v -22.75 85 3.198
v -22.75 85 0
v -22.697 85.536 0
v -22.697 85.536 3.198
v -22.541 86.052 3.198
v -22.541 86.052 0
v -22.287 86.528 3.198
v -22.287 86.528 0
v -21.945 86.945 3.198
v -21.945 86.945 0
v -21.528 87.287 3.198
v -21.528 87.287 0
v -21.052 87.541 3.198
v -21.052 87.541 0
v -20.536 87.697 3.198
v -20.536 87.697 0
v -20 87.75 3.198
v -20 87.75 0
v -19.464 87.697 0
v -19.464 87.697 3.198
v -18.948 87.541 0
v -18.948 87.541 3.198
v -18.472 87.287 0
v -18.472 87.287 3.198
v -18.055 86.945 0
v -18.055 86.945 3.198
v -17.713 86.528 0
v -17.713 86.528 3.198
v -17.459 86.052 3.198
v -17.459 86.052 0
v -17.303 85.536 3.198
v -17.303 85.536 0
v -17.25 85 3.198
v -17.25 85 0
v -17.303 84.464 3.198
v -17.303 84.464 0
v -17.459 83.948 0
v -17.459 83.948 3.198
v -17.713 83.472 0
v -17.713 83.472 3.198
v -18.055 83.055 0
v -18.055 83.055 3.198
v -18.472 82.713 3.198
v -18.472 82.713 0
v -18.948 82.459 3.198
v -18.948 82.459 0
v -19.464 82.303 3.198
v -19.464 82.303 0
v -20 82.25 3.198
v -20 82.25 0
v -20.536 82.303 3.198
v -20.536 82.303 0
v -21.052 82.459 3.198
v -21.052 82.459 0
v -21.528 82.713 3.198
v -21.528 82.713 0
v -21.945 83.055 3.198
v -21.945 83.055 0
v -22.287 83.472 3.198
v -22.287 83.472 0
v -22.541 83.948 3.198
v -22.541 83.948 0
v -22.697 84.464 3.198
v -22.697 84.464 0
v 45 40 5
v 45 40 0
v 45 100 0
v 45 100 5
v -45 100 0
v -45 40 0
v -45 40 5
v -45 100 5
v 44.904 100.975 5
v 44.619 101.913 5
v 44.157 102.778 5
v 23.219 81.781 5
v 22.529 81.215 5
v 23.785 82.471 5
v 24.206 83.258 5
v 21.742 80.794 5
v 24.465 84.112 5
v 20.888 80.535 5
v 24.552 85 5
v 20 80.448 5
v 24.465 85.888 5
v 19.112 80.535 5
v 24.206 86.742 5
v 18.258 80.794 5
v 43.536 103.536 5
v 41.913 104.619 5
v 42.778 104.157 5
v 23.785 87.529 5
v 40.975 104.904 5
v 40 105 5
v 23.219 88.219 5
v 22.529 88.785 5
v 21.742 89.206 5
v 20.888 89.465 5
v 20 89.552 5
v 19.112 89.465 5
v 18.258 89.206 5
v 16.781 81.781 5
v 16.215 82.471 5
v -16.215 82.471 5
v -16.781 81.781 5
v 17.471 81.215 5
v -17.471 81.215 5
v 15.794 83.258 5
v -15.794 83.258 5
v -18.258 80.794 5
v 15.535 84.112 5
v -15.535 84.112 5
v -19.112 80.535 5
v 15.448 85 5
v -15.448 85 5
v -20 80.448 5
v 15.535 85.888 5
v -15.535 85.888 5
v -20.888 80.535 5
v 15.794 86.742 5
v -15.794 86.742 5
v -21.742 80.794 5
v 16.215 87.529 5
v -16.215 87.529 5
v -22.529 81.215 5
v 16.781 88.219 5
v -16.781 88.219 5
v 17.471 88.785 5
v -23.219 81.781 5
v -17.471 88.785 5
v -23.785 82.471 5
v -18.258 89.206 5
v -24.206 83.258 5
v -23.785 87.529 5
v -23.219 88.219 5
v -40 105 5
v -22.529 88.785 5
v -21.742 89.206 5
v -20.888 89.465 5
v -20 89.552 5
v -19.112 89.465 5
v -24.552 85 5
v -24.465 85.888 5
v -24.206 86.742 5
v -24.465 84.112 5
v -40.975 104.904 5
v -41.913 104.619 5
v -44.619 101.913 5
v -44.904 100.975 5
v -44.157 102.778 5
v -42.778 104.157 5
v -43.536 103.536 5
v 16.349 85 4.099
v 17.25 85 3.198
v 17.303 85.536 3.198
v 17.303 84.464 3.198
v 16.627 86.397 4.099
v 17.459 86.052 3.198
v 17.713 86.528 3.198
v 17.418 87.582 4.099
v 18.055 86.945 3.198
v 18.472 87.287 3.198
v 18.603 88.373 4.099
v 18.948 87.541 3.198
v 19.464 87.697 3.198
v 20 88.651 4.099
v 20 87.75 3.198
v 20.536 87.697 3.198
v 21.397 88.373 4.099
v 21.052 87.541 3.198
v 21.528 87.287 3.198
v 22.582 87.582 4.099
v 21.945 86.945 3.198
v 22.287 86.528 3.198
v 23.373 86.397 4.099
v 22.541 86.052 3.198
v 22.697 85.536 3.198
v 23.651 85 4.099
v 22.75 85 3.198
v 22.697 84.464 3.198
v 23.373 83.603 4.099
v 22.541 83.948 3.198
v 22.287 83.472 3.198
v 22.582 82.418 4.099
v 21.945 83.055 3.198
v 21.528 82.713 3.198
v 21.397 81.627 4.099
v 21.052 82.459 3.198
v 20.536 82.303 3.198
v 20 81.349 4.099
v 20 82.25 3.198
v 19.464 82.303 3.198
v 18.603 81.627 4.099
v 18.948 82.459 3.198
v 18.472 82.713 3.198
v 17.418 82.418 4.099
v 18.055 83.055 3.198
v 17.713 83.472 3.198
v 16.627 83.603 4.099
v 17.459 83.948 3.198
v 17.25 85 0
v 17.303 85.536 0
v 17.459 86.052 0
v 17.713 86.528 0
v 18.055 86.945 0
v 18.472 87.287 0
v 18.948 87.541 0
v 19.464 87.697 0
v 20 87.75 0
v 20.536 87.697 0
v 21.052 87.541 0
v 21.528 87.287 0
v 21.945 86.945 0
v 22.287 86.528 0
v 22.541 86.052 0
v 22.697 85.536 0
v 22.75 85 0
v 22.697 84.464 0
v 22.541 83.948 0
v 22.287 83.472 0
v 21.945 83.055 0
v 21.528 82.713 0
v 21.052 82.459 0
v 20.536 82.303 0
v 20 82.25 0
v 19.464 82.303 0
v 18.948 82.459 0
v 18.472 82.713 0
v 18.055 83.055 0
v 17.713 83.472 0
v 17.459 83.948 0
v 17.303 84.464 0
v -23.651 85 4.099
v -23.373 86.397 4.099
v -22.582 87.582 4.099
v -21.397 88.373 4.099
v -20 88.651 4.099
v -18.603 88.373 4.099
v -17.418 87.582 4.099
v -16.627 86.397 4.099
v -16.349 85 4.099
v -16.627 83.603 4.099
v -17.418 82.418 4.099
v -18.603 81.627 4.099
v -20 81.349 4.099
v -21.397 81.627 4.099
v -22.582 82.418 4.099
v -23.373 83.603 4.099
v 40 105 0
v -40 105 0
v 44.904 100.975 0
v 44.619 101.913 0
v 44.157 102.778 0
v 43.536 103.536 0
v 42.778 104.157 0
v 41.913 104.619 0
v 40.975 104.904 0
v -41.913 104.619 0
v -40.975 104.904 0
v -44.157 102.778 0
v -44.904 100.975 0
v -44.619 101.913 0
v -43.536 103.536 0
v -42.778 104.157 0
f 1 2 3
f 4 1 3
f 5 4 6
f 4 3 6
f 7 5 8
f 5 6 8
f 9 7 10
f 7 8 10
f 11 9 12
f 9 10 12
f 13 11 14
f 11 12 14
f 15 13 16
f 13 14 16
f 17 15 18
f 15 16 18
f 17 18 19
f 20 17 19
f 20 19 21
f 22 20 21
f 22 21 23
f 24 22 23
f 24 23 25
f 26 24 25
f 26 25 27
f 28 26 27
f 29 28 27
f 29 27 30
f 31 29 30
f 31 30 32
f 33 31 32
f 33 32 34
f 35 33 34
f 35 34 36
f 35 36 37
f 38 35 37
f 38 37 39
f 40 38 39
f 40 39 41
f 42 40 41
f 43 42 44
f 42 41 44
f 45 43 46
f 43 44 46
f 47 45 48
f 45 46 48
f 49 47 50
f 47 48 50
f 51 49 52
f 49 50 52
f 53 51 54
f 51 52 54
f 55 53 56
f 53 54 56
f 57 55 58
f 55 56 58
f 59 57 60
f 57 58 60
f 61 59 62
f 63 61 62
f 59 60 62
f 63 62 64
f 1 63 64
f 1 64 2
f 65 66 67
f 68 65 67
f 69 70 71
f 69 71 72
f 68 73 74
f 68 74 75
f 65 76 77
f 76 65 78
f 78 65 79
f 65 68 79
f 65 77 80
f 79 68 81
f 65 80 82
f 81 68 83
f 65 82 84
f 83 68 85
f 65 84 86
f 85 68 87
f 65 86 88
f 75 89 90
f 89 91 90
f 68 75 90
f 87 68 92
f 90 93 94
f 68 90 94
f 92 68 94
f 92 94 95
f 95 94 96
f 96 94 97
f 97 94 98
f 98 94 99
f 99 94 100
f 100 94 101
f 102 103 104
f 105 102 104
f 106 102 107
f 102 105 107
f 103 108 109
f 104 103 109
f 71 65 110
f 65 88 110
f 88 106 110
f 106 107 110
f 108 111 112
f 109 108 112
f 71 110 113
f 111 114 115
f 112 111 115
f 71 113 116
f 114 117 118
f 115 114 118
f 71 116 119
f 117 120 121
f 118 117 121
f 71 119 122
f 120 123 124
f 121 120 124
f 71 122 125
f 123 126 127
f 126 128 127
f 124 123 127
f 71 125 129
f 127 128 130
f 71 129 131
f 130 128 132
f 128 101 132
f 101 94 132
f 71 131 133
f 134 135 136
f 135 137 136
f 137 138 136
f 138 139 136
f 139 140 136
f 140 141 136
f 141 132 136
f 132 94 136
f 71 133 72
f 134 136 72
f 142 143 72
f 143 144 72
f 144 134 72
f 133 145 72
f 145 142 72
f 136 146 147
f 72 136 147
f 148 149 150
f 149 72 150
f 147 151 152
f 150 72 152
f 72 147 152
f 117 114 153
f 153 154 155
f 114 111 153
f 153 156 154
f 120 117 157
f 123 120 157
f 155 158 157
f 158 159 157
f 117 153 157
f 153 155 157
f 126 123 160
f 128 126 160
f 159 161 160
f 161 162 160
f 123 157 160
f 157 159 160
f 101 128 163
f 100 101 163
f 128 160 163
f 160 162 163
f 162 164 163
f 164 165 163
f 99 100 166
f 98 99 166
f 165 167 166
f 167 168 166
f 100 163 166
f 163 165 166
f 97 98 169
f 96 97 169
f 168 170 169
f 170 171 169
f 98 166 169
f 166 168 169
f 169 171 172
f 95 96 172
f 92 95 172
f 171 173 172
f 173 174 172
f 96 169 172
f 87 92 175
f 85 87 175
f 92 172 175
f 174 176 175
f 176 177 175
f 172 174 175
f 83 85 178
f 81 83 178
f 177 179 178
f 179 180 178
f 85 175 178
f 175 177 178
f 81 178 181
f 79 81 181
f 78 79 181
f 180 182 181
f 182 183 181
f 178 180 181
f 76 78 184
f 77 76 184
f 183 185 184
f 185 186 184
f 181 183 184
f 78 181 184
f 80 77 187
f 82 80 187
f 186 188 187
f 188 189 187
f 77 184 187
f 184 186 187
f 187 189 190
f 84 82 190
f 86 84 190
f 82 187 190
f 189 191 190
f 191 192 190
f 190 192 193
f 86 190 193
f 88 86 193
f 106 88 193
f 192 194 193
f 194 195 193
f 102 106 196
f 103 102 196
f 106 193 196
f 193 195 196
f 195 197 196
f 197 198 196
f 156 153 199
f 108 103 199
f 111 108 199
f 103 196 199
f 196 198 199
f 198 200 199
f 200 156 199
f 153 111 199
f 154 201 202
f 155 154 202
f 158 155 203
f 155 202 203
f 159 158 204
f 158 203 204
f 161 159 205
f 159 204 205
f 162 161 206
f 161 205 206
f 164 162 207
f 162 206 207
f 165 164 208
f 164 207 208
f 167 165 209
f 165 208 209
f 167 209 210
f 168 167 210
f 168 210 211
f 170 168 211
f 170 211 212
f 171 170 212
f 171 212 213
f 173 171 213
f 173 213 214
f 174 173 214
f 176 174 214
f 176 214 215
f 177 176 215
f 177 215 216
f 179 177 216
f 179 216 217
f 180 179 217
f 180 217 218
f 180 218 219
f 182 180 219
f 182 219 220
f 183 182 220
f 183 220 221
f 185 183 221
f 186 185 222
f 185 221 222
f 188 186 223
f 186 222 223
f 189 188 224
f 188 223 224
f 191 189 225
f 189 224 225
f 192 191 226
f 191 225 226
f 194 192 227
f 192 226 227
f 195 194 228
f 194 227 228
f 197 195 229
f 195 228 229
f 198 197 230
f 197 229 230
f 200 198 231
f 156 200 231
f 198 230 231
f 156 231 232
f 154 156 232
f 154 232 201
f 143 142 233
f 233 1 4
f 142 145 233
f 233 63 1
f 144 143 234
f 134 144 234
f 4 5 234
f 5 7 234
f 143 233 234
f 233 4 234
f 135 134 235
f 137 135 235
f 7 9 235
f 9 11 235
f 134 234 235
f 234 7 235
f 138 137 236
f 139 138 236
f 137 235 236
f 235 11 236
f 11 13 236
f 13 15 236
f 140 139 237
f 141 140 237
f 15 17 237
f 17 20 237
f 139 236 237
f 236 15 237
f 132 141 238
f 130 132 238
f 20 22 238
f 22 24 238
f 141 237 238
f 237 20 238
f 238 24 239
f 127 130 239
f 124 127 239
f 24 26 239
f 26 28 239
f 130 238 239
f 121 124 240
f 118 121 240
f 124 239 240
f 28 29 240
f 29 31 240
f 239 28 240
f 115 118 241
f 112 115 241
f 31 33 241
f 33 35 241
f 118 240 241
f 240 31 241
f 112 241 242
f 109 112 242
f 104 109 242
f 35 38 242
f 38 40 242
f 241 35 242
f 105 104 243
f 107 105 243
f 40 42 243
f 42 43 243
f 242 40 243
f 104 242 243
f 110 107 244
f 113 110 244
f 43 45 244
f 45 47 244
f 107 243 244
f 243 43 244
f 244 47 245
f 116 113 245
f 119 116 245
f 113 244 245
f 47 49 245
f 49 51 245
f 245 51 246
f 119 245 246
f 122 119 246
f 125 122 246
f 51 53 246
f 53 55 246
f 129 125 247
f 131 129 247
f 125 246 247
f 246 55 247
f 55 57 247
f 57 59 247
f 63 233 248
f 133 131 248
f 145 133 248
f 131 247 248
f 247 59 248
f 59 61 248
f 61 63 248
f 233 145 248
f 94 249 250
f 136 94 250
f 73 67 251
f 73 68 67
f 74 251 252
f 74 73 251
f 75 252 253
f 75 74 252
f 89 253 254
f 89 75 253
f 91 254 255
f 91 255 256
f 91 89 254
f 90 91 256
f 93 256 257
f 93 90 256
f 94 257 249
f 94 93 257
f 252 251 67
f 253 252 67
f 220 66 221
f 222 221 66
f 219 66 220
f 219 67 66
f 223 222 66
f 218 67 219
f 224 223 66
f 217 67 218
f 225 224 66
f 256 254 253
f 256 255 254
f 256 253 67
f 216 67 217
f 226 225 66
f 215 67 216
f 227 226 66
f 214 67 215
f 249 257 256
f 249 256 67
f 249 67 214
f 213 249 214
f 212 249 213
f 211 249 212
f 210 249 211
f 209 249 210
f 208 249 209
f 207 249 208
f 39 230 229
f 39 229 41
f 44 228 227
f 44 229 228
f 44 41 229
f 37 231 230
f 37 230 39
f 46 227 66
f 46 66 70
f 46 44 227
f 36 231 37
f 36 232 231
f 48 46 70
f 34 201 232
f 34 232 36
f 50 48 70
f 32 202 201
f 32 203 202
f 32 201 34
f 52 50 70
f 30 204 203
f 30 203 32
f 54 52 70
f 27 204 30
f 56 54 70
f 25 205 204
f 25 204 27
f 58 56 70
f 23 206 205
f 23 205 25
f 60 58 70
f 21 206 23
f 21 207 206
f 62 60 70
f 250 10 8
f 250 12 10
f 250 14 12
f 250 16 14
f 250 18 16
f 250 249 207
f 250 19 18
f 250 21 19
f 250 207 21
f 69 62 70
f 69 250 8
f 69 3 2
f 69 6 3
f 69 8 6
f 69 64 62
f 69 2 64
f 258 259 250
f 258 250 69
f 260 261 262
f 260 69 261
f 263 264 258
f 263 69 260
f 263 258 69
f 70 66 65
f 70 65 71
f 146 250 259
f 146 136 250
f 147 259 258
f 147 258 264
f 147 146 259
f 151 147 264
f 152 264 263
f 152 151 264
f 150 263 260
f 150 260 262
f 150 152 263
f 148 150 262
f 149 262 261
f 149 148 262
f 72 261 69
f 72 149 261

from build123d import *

# Parameters (mm, degrees)
SKETCH_1_W      = 90
SKETCH_1_H      = 65
EXTRUDE_1_DEPTH = 5
HOLE_WIZARD_1_D = 5.5
HOLE_WIZARD_2_D = 5.5
CHAMFER_1_SIZE  = 1.80208992
CHAMFER_2_SIZE  = 1.80208992
FILLET_1_R      = 5
FILLET_2_R      = 5


with BuildPart() as part:
    # 草图1 → 凸台-拉伸1 (new body)
    with BuildSketch(Plane(origin=(0, 0, 0), x_dir=(-1, 0, 0), z_dir=(0, 0, -1))):
        with Locations((0, 72.5)):
            Rectangle(SKETCH_1_W, SKETCH_1_H)
    extrude(amount=-EXTRUDE_1_DEPTH)

    # 孔1 (through all)
    with Locations(Plane.XY.offset(5)):
        with Locations((-20, 85)):
            Hole(HOLE_WIZARD_1_D / 2)

    # 孔2 (through all)
    with Locations(Plane.XY.offset(5)):
        with Locations((20, 85)):
            Hole(HOLE_WIZARD_2_D / 2)

    # 倒角1
    chamfer_1_edges = [part.edges().sort_by_distance(p)[0] for p in [
        (-17.25, 85, 5),
    ]]
    chamfer(chamfer_1_edges, length=CHAMFER_1_SIZE)

    # 倒角2
    chamfer_2_edges = [part.edges().sort_by_distance(p)[0] for p in [
        (22.75, 85, 5),
    ]]
    chamfer(chamfer_2_edges, length=CHAMFER_2_SIZE)

    # 圆角1
    fillet_1_edges = [part.edges().sort_by_distance(p)[0] for p in [
        (45, 105, 2.5),
    ]]
    fillet(fillet_1_edges, radius=FILLET_1_R)

    # 圆角2
    fillet_2_edges = [part.edges().sort_by_distance(p)[0] for p in [
        (-45, 105, 2.5),
    ]]
    fillet(fillet_2_edges, radius=FILLET_2_R)


solid = part.part
